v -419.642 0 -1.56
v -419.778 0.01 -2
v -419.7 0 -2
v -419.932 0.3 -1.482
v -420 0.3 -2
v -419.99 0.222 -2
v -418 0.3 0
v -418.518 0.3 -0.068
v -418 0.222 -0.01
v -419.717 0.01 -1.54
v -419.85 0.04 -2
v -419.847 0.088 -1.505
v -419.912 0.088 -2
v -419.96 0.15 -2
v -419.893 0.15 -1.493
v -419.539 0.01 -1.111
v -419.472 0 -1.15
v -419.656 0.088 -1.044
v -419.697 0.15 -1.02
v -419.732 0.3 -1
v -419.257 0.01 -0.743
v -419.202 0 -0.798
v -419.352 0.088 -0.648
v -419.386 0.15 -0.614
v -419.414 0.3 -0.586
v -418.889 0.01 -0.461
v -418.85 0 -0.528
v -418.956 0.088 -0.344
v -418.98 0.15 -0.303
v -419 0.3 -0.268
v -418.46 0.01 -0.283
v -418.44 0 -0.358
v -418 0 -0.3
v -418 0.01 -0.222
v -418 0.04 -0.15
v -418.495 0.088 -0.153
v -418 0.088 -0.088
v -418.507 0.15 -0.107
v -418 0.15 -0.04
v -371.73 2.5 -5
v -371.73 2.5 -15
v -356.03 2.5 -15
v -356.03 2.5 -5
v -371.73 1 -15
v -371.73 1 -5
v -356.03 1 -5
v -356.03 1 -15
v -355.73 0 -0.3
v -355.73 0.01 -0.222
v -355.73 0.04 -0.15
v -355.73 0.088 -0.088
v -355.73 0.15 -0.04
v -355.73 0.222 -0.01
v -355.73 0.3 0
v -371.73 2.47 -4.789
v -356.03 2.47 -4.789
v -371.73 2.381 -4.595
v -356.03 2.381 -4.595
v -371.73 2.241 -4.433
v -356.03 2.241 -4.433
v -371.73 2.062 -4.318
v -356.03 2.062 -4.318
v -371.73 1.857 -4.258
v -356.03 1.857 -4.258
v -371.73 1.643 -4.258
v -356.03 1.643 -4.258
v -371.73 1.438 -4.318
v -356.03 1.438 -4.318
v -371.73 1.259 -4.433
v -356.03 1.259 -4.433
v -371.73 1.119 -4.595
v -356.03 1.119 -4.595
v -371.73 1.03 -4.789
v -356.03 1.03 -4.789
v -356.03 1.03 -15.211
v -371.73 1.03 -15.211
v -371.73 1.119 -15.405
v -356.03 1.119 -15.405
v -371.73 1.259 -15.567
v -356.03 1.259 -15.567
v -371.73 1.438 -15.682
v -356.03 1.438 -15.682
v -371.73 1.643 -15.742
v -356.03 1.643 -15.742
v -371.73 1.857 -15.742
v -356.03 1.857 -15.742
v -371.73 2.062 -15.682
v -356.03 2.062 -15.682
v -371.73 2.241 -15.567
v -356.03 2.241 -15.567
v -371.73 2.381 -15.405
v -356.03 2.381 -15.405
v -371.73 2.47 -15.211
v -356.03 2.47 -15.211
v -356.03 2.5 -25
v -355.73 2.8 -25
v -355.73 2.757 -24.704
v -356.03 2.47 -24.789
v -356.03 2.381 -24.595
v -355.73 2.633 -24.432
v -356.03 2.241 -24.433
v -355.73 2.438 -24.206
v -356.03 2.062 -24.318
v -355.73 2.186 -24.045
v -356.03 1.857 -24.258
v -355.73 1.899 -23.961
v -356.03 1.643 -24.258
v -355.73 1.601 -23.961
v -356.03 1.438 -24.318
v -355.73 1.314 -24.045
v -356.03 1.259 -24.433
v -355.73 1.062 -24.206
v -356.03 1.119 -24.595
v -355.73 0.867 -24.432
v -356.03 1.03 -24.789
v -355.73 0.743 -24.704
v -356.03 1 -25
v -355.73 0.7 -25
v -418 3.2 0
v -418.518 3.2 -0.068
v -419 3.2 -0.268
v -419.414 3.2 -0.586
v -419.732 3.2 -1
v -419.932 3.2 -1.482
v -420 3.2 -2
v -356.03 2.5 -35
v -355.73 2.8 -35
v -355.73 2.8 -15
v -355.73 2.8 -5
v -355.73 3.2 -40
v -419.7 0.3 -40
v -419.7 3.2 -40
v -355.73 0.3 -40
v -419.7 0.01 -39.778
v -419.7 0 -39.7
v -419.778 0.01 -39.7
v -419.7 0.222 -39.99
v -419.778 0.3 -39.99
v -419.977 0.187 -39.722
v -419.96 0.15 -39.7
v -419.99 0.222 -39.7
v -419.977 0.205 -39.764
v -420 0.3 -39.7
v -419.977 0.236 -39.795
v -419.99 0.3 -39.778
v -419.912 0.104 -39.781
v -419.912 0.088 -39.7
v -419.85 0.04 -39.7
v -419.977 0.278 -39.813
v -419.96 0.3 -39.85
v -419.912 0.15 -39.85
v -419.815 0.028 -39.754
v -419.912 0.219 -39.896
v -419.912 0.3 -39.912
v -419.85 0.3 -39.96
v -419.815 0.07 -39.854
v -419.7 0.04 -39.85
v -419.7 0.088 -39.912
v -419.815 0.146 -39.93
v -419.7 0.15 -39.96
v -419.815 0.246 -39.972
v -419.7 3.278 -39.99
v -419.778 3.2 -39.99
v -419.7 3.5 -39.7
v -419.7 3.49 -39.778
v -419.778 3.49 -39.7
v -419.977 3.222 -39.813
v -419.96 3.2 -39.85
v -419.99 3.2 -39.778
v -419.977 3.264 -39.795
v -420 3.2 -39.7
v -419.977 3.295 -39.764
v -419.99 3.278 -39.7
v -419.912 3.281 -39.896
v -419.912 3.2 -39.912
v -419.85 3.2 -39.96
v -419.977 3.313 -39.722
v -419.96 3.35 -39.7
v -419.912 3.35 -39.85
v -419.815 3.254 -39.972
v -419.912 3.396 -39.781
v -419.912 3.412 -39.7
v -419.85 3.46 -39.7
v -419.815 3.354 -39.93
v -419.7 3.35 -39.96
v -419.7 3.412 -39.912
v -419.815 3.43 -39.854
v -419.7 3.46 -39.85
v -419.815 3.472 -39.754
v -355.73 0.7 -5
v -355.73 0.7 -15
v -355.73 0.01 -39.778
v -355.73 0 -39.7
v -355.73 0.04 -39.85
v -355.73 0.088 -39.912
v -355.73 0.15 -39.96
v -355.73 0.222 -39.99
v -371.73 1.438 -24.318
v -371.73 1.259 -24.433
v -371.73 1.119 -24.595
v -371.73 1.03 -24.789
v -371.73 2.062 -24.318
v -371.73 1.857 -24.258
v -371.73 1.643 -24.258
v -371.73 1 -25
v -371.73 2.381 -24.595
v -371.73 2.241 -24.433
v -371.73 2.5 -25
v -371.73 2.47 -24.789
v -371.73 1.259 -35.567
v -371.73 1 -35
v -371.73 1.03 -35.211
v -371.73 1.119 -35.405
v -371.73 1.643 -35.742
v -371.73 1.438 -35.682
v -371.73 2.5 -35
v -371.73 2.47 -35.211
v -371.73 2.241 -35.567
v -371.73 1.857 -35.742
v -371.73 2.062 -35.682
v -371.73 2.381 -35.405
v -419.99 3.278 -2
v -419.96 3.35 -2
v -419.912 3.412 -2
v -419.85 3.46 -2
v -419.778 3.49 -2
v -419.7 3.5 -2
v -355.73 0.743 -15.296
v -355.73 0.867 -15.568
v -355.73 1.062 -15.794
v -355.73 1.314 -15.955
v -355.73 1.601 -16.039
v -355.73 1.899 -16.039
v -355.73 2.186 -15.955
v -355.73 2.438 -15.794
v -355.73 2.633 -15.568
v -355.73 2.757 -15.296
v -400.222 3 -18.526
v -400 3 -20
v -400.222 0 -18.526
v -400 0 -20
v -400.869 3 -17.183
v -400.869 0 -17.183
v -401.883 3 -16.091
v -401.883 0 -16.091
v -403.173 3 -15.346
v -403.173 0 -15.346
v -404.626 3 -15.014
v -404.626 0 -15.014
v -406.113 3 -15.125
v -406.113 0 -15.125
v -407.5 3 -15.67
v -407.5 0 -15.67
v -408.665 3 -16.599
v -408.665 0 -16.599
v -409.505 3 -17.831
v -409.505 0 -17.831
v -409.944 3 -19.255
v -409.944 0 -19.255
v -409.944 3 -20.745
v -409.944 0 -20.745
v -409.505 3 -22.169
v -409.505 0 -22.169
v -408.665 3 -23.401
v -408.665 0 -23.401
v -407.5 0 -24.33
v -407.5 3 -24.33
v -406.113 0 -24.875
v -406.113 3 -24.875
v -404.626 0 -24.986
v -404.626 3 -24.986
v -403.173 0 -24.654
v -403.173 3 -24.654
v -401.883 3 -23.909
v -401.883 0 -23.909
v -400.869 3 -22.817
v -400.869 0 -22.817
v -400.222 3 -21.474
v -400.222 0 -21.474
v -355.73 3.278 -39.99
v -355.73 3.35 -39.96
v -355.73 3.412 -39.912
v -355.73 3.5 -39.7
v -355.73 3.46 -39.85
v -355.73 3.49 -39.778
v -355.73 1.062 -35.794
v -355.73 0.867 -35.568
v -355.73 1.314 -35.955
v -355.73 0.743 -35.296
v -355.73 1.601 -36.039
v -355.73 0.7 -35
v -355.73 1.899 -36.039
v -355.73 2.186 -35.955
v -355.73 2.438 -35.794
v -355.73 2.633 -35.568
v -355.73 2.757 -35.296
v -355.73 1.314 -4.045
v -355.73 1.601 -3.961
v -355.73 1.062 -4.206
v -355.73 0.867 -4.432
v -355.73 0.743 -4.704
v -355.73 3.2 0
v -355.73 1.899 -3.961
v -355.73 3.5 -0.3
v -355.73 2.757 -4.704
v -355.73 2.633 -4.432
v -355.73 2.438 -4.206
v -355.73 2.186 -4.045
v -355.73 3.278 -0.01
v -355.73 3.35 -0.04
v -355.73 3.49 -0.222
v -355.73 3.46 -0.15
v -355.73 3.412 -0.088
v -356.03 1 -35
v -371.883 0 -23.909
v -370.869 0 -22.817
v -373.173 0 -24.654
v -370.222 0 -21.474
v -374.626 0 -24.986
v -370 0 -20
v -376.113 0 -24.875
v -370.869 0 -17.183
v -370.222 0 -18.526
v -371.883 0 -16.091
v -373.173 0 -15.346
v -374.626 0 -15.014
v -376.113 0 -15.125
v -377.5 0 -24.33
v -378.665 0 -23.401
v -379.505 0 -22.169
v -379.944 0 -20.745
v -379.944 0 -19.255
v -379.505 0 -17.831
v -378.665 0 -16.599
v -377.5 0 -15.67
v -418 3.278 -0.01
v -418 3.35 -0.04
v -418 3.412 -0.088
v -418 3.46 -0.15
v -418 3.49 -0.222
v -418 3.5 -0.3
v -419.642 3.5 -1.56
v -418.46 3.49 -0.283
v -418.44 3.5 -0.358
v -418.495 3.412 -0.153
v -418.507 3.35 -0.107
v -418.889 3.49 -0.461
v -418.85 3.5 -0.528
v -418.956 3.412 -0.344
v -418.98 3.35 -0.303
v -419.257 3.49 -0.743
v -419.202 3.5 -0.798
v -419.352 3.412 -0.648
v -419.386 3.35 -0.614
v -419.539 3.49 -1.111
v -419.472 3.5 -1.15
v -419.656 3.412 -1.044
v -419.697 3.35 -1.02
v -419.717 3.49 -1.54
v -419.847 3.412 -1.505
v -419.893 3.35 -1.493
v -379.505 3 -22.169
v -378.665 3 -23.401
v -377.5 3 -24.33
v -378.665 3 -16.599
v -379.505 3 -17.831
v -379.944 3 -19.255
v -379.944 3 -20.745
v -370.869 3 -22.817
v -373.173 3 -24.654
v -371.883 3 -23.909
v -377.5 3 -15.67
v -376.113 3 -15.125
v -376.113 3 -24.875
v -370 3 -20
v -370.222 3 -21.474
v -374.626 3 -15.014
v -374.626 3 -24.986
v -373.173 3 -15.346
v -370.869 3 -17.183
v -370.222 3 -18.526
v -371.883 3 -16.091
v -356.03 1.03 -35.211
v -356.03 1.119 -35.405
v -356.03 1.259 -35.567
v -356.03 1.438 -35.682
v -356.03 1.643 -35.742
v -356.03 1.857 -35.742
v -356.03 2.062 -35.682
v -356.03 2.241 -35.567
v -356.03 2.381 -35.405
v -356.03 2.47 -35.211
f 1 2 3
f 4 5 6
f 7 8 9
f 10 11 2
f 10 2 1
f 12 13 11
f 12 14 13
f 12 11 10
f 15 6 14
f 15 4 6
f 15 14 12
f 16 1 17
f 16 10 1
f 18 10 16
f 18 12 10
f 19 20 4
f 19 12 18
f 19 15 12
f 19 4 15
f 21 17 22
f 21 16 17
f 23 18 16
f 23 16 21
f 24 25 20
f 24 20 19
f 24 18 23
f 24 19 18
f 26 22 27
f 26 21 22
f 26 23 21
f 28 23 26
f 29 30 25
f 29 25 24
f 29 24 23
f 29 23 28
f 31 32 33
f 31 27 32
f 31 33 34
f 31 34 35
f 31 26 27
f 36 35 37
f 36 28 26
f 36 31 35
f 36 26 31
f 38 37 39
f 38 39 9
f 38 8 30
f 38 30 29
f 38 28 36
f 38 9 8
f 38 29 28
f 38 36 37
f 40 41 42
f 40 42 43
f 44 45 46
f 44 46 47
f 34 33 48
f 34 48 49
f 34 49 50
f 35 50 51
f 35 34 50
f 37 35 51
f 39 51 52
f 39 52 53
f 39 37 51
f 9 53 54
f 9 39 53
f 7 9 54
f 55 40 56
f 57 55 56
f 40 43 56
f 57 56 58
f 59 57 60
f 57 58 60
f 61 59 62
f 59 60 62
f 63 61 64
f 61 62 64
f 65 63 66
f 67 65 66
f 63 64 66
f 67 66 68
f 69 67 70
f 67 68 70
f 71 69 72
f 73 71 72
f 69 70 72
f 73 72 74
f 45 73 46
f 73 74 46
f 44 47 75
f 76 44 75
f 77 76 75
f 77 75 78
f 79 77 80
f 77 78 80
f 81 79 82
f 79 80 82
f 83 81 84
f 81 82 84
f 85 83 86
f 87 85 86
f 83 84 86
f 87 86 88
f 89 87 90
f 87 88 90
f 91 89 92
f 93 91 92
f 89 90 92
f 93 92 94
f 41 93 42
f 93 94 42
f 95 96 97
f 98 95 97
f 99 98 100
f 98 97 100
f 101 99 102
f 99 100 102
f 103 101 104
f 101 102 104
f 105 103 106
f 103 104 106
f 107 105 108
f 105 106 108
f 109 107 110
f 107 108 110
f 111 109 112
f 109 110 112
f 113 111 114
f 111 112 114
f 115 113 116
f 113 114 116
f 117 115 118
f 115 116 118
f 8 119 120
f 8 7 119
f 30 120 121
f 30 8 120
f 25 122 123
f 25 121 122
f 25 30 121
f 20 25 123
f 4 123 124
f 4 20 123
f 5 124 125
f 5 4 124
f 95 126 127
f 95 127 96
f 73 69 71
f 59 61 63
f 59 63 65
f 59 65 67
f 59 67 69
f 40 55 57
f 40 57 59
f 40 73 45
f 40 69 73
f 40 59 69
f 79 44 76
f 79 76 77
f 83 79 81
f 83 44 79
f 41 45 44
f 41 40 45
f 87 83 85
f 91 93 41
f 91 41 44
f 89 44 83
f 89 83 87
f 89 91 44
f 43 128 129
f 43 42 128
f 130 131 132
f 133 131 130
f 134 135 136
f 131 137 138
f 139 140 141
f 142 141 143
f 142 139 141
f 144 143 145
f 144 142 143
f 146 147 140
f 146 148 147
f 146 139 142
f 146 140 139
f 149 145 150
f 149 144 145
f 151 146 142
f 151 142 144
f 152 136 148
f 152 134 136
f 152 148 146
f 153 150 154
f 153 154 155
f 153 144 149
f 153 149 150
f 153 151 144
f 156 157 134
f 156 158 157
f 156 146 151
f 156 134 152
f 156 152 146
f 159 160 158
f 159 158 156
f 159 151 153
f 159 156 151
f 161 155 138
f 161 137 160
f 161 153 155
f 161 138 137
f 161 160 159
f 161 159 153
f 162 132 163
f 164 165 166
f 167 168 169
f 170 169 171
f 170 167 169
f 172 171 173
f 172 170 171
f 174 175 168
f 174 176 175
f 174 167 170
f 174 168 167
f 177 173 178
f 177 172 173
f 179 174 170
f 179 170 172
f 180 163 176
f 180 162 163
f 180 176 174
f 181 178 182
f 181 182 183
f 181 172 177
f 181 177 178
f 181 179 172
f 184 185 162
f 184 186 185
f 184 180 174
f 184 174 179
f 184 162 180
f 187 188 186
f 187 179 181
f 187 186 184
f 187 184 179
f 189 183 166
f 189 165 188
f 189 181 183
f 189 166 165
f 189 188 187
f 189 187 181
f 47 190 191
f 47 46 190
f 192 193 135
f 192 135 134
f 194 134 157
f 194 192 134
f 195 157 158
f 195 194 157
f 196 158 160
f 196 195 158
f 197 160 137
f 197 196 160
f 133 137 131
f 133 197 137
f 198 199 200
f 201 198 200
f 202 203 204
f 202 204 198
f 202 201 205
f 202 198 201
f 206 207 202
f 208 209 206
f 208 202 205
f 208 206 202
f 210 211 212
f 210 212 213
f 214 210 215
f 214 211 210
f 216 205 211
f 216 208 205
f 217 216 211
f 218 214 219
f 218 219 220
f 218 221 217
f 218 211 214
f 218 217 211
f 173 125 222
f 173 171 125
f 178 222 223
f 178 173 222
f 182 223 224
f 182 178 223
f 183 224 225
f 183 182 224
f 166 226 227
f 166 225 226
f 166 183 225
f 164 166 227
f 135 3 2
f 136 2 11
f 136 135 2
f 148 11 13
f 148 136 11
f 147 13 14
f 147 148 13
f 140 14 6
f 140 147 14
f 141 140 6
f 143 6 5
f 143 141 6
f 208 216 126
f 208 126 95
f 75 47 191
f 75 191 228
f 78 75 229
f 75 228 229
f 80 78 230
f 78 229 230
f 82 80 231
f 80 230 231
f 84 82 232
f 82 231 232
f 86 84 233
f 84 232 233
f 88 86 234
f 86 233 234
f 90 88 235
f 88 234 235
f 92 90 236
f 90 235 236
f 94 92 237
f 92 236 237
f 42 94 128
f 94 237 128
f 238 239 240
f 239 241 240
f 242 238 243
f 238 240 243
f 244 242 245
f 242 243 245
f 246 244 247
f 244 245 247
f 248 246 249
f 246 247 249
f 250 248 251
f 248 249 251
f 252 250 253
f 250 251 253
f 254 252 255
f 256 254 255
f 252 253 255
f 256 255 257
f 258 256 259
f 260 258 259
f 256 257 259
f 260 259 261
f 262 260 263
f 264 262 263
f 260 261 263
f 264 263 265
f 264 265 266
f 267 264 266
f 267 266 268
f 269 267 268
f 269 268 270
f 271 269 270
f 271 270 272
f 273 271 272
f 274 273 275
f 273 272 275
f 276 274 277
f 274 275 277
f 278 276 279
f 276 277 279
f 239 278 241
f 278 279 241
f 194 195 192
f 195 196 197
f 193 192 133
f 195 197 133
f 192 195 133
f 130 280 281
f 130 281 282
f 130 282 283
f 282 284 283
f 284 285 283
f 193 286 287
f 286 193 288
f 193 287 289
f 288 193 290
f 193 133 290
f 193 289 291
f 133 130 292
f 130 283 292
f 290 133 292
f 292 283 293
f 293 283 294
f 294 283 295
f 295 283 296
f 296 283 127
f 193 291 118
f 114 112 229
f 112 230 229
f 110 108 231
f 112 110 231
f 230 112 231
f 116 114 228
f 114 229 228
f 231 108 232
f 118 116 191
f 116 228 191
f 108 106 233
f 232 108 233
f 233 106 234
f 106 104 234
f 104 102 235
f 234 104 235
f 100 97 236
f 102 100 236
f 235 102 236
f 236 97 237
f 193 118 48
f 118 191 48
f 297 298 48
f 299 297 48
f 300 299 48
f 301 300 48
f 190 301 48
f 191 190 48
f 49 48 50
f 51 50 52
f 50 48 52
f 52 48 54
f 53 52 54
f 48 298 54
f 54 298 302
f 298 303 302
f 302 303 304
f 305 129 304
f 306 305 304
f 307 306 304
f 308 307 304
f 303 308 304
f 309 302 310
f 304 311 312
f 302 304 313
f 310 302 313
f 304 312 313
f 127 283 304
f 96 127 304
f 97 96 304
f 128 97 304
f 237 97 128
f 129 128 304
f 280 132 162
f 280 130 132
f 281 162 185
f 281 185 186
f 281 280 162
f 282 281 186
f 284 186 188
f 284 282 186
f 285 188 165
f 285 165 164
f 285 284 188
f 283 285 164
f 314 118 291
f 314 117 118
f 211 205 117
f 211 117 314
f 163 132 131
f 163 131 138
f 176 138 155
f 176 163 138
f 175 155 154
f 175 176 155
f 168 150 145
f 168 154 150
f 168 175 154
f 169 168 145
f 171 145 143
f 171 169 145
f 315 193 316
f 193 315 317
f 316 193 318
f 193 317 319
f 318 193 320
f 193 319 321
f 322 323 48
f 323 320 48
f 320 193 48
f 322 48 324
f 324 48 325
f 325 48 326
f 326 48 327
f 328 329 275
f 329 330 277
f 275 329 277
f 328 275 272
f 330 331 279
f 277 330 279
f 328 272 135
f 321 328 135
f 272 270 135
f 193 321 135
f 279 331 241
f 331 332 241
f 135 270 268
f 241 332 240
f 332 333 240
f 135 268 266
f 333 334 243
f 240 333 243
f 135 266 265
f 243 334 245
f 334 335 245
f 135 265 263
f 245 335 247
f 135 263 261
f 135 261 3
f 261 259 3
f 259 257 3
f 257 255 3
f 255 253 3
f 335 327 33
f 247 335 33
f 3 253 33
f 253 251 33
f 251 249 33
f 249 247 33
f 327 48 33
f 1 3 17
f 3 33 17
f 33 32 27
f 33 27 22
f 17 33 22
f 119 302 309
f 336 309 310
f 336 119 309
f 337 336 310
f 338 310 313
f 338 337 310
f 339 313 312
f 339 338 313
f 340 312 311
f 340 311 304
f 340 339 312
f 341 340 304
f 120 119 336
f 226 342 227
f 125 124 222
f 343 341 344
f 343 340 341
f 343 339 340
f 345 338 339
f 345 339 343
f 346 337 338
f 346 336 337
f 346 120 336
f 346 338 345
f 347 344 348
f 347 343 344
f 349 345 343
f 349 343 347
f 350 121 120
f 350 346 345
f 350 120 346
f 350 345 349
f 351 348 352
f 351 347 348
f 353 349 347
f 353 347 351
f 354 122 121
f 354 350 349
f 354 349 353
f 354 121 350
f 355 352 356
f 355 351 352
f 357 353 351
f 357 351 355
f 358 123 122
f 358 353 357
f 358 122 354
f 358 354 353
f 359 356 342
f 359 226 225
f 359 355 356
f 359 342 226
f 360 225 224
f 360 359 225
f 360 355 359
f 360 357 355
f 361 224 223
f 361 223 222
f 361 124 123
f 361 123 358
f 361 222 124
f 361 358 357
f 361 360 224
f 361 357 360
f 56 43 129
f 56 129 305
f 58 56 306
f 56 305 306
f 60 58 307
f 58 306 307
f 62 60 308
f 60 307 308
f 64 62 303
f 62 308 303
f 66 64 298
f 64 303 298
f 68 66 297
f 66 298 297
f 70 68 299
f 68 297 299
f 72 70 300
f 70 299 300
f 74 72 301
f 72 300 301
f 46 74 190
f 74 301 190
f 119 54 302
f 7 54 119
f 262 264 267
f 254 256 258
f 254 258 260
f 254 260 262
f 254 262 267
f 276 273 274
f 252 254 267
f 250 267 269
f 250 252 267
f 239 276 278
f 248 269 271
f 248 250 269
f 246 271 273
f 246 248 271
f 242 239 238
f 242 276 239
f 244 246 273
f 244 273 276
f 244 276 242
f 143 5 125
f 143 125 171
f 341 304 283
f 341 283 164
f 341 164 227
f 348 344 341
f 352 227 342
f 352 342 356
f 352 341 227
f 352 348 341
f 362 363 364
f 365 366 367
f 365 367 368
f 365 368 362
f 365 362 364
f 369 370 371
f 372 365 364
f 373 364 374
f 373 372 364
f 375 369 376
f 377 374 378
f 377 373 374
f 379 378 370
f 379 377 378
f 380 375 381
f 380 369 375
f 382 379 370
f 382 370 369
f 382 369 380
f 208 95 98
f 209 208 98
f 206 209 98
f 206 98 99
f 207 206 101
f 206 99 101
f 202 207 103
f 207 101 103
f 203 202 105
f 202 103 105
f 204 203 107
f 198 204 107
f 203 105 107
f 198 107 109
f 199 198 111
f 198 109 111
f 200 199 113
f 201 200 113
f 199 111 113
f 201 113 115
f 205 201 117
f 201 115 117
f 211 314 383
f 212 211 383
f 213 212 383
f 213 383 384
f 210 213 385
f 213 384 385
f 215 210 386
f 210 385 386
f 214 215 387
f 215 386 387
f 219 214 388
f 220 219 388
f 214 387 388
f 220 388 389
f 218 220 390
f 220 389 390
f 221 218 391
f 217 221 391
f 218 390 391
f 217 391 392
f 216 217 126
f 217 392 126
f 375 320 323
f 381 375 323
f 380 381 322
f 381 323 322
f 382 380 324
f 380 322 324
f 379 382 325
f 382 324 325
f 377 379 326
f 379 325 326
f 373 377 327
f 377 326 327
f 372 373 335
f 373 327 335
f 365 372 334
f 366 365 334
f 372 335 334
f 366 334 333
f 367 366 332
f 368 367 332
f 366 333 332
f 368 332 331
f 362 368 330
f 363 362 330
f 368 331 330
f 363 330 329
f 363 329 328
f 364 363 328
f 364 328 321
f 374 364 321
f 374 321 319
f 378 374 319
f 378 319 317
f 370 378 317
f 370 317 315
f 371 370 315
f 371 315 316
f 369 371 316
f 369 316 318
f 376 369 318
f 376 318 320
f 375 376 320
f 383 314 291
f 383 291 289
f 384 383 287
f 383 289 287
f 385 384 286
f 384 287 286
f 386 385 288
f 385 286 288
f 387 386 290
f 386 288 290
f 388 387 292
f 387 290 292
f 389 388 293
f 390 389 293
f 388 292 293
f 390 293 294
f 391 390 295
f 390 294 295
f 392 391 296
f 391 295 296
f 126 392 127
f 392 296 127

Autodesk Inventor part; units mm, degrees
ref_plane "YZ Plane" through (0, 0, 0) normal (1, 0, 0) x (0, 1, 0)
ref_plane "XZ Plane" through (0, 0, 0) normal (0, 1, 0) x (-1, 0, 0)
sketch "Sketch1" plane through (0, 0, 0) normal (0, 1, 0) x (-1, 0, 0)
  line L0 (0, 0) -> (420, 0)
  line L1 (420, 0) -> (420, -40)
  line L2 (420, -40) -> (0, -40)
  line L3 (0, -40) -> (0, 0)
  dimension "d0" = 420
  dimension "d1" = 40
extrude "Extrusion1" add sketch "Sketch1" along normal blind 3.5
fillet "Fillet1" radius 0.3 10 edges at (-210, 3.5, 0) (-210, 0, 0) (0, 0, -20) (0, 3.5, -20) (0, 1.75, -40) (-210, 3.5, -40) (-210, 0, -40) (-420, 0, -20) (-420, 1.75, -40) (-420, 3.5, -20)
sketch "Sketch2" plane through (0, 0, 0) normal (0, -1, 0) x (1, 0, 0)
  line L0 (-419.7, -39.7) -> (-419.7, -0.3) projected
  line L1 (-419.7, -20) -> (0, -20)
  circle A0 centre (-405, -20) radius 5
  circle A1 centre (-375, -20) radius 5
  circle A2 centre (-345, -20) radius 5
  circle A3 centre (-315, -20) radius 5
  line L2 (-420, 0) -> (-420, -39.7) projected
  line L3 (-315, -20) -> (-315, -8.0411)
  line L4 (-210.3, -20) -> (-630, -20)
  circle A4 centre (-225, -20) radius 5
  circle A5 centre (-255, -20) radius 5
  circle A6 centre (-285, -20) radius 5
  point P0 (0, 0)
  point P1 (-420, -0.3)
  dimension "d5" = 10
  dimension "d6" = 10
  dimension "d7" = 10
  dimension "d8" = 10
  dimension "d9" = 15
  dimension "d10" = 30
  dimension "d11" = 30
  dimension "d12" = 30
ref_plane "Work Plane1" through (-210, 0.3, -39.7) normal (1, 0, 0) x (0, 0, -1)
extrude "Extrusion2" cut sketch "Sketch2" against normal blind 3
mirror "Mirror1" about plane through (-210, 0.3, -39.7) normal (1, 0, 0) of "Extrusion2"
fillet "Fillet2" radius 2 6 edges at (-0.0879, 3.4121, -0.0879) (-0.0879, 0.0879, -0.0879) (0, 1.75, 0) (-419.9121, 3.4121, -0.0879) (-419.9121, 0.0879, -0.0879) (-420, 1.75, 0)
sketch "Sketch3" plane through (0, 3.5, 0) normal (0, 1, 0) x (1, 0, 0)
  line L0 (4.2695, -58.2258) -> (-175.7305, -58.2258)
  line L1 (-175.7305, -58.2258) -> (-175.7305, 85.9661)
  line L2 (-175.7305, 85.9661) -> (4.2695, 85.9661)
  line L3 (4.2695, 85.9661) -> (4.2695, -58.2258)
  line L4 (-175.7305, 85.9661) -> (-355.7305, 85.9661)
  line L5 (-355.7305, 85.9661) -> (-355.7305, -58.2258)
  line L6 (-355.7305, -58.2258) -> (-175.7305, -58.2258)
  line L7 (-175.7305, -58.2258) -> (-175.7305, 85.9661)
  line L8 (-355.7305, -58.2258) -> (-453.8172, -58.2258)
  line L9 (-453.8172, -58.2258) -> (-453.8172, 85.9661)
  line L10 (-453.8172, 85.9661) -> (-355.7305, 85.9661)
  line L11 (-355.7305, 85.9661) -> (-355.7305, -58.2258)
  point P0 (0, 0)
  dimension "d18" = 180
  dimension "d19" = 180
extrude "Extrusion8" cut sketch "Sketch3" against normal through all contours L0 L1 L2 L3 | L6 L5 L4 L1
sketch "Sketch7" plane through (-355.7305, 3.5, -0.3) normal (1, 0, 0) x (0, 0, -1)
  line L0 (4.7, -1.75) -> (14.7, -1.75) construction
  line L1 (-0.3, -3.2) -> (-0.3, -0.3) projected
  line L2 (4.7, -2.5) -> (14.7, -2.5)
  line L3 (14.7, -1) -> (4.7, -1)
  arc A0 (4.7, -1) -> (4.7, -2.5) centre (4.7, -1.75) ccw
  arc A1 (14.7, -2.5) -> (14.7, -1) centre (14.7, -1.75) ccw
  line L4 (24.7, -1.75) -> (34.7, -1.75) construction
  line L5 (24.7, -2.5) -> (34.7, -2.5)
  line L6 (34.7, -1) -> (24.7, -1)
  arc A2 (24.7, -1) -> (24.7, -2.5) centre (24.7, -1.75) ccw
  arc A3 (34.7, -2.5) -> (34.7, -1) centre (34.7, -1.75) ccw
  line L7 (39.7, -0.3) -> (39.7, -3.2) projected
  point P0 (-0.3, -3.5)
  point P1 (9.7, -1.75)
  point P2 (29.7, -1.75)
  dimension "d56" = 5
  dimension "d57" = 1.5
  dimension "d58" = 5
  dimension "d59" = 1.5
  dimension "d60" = 10
  dimension "d61" = 10
extrude "Extrusion9" cut sketch "Sketch7" against normal blind 16
chamfer "Chamfer3" distance 0.3 angle 45 8 edges at (-355.7305, 2.5, -10) (-355.7305, 1.75, -15.75) (-355.7305, 1, -10) (-355.7305, 1.75, -4.25) (-355.7305, 1.75, -24.25) (-355.7305, 2.5, -30) (-355.7305, 1.75, -35.75) (-355.7305, 1, -30)
properties part number "LeftClamo3"
